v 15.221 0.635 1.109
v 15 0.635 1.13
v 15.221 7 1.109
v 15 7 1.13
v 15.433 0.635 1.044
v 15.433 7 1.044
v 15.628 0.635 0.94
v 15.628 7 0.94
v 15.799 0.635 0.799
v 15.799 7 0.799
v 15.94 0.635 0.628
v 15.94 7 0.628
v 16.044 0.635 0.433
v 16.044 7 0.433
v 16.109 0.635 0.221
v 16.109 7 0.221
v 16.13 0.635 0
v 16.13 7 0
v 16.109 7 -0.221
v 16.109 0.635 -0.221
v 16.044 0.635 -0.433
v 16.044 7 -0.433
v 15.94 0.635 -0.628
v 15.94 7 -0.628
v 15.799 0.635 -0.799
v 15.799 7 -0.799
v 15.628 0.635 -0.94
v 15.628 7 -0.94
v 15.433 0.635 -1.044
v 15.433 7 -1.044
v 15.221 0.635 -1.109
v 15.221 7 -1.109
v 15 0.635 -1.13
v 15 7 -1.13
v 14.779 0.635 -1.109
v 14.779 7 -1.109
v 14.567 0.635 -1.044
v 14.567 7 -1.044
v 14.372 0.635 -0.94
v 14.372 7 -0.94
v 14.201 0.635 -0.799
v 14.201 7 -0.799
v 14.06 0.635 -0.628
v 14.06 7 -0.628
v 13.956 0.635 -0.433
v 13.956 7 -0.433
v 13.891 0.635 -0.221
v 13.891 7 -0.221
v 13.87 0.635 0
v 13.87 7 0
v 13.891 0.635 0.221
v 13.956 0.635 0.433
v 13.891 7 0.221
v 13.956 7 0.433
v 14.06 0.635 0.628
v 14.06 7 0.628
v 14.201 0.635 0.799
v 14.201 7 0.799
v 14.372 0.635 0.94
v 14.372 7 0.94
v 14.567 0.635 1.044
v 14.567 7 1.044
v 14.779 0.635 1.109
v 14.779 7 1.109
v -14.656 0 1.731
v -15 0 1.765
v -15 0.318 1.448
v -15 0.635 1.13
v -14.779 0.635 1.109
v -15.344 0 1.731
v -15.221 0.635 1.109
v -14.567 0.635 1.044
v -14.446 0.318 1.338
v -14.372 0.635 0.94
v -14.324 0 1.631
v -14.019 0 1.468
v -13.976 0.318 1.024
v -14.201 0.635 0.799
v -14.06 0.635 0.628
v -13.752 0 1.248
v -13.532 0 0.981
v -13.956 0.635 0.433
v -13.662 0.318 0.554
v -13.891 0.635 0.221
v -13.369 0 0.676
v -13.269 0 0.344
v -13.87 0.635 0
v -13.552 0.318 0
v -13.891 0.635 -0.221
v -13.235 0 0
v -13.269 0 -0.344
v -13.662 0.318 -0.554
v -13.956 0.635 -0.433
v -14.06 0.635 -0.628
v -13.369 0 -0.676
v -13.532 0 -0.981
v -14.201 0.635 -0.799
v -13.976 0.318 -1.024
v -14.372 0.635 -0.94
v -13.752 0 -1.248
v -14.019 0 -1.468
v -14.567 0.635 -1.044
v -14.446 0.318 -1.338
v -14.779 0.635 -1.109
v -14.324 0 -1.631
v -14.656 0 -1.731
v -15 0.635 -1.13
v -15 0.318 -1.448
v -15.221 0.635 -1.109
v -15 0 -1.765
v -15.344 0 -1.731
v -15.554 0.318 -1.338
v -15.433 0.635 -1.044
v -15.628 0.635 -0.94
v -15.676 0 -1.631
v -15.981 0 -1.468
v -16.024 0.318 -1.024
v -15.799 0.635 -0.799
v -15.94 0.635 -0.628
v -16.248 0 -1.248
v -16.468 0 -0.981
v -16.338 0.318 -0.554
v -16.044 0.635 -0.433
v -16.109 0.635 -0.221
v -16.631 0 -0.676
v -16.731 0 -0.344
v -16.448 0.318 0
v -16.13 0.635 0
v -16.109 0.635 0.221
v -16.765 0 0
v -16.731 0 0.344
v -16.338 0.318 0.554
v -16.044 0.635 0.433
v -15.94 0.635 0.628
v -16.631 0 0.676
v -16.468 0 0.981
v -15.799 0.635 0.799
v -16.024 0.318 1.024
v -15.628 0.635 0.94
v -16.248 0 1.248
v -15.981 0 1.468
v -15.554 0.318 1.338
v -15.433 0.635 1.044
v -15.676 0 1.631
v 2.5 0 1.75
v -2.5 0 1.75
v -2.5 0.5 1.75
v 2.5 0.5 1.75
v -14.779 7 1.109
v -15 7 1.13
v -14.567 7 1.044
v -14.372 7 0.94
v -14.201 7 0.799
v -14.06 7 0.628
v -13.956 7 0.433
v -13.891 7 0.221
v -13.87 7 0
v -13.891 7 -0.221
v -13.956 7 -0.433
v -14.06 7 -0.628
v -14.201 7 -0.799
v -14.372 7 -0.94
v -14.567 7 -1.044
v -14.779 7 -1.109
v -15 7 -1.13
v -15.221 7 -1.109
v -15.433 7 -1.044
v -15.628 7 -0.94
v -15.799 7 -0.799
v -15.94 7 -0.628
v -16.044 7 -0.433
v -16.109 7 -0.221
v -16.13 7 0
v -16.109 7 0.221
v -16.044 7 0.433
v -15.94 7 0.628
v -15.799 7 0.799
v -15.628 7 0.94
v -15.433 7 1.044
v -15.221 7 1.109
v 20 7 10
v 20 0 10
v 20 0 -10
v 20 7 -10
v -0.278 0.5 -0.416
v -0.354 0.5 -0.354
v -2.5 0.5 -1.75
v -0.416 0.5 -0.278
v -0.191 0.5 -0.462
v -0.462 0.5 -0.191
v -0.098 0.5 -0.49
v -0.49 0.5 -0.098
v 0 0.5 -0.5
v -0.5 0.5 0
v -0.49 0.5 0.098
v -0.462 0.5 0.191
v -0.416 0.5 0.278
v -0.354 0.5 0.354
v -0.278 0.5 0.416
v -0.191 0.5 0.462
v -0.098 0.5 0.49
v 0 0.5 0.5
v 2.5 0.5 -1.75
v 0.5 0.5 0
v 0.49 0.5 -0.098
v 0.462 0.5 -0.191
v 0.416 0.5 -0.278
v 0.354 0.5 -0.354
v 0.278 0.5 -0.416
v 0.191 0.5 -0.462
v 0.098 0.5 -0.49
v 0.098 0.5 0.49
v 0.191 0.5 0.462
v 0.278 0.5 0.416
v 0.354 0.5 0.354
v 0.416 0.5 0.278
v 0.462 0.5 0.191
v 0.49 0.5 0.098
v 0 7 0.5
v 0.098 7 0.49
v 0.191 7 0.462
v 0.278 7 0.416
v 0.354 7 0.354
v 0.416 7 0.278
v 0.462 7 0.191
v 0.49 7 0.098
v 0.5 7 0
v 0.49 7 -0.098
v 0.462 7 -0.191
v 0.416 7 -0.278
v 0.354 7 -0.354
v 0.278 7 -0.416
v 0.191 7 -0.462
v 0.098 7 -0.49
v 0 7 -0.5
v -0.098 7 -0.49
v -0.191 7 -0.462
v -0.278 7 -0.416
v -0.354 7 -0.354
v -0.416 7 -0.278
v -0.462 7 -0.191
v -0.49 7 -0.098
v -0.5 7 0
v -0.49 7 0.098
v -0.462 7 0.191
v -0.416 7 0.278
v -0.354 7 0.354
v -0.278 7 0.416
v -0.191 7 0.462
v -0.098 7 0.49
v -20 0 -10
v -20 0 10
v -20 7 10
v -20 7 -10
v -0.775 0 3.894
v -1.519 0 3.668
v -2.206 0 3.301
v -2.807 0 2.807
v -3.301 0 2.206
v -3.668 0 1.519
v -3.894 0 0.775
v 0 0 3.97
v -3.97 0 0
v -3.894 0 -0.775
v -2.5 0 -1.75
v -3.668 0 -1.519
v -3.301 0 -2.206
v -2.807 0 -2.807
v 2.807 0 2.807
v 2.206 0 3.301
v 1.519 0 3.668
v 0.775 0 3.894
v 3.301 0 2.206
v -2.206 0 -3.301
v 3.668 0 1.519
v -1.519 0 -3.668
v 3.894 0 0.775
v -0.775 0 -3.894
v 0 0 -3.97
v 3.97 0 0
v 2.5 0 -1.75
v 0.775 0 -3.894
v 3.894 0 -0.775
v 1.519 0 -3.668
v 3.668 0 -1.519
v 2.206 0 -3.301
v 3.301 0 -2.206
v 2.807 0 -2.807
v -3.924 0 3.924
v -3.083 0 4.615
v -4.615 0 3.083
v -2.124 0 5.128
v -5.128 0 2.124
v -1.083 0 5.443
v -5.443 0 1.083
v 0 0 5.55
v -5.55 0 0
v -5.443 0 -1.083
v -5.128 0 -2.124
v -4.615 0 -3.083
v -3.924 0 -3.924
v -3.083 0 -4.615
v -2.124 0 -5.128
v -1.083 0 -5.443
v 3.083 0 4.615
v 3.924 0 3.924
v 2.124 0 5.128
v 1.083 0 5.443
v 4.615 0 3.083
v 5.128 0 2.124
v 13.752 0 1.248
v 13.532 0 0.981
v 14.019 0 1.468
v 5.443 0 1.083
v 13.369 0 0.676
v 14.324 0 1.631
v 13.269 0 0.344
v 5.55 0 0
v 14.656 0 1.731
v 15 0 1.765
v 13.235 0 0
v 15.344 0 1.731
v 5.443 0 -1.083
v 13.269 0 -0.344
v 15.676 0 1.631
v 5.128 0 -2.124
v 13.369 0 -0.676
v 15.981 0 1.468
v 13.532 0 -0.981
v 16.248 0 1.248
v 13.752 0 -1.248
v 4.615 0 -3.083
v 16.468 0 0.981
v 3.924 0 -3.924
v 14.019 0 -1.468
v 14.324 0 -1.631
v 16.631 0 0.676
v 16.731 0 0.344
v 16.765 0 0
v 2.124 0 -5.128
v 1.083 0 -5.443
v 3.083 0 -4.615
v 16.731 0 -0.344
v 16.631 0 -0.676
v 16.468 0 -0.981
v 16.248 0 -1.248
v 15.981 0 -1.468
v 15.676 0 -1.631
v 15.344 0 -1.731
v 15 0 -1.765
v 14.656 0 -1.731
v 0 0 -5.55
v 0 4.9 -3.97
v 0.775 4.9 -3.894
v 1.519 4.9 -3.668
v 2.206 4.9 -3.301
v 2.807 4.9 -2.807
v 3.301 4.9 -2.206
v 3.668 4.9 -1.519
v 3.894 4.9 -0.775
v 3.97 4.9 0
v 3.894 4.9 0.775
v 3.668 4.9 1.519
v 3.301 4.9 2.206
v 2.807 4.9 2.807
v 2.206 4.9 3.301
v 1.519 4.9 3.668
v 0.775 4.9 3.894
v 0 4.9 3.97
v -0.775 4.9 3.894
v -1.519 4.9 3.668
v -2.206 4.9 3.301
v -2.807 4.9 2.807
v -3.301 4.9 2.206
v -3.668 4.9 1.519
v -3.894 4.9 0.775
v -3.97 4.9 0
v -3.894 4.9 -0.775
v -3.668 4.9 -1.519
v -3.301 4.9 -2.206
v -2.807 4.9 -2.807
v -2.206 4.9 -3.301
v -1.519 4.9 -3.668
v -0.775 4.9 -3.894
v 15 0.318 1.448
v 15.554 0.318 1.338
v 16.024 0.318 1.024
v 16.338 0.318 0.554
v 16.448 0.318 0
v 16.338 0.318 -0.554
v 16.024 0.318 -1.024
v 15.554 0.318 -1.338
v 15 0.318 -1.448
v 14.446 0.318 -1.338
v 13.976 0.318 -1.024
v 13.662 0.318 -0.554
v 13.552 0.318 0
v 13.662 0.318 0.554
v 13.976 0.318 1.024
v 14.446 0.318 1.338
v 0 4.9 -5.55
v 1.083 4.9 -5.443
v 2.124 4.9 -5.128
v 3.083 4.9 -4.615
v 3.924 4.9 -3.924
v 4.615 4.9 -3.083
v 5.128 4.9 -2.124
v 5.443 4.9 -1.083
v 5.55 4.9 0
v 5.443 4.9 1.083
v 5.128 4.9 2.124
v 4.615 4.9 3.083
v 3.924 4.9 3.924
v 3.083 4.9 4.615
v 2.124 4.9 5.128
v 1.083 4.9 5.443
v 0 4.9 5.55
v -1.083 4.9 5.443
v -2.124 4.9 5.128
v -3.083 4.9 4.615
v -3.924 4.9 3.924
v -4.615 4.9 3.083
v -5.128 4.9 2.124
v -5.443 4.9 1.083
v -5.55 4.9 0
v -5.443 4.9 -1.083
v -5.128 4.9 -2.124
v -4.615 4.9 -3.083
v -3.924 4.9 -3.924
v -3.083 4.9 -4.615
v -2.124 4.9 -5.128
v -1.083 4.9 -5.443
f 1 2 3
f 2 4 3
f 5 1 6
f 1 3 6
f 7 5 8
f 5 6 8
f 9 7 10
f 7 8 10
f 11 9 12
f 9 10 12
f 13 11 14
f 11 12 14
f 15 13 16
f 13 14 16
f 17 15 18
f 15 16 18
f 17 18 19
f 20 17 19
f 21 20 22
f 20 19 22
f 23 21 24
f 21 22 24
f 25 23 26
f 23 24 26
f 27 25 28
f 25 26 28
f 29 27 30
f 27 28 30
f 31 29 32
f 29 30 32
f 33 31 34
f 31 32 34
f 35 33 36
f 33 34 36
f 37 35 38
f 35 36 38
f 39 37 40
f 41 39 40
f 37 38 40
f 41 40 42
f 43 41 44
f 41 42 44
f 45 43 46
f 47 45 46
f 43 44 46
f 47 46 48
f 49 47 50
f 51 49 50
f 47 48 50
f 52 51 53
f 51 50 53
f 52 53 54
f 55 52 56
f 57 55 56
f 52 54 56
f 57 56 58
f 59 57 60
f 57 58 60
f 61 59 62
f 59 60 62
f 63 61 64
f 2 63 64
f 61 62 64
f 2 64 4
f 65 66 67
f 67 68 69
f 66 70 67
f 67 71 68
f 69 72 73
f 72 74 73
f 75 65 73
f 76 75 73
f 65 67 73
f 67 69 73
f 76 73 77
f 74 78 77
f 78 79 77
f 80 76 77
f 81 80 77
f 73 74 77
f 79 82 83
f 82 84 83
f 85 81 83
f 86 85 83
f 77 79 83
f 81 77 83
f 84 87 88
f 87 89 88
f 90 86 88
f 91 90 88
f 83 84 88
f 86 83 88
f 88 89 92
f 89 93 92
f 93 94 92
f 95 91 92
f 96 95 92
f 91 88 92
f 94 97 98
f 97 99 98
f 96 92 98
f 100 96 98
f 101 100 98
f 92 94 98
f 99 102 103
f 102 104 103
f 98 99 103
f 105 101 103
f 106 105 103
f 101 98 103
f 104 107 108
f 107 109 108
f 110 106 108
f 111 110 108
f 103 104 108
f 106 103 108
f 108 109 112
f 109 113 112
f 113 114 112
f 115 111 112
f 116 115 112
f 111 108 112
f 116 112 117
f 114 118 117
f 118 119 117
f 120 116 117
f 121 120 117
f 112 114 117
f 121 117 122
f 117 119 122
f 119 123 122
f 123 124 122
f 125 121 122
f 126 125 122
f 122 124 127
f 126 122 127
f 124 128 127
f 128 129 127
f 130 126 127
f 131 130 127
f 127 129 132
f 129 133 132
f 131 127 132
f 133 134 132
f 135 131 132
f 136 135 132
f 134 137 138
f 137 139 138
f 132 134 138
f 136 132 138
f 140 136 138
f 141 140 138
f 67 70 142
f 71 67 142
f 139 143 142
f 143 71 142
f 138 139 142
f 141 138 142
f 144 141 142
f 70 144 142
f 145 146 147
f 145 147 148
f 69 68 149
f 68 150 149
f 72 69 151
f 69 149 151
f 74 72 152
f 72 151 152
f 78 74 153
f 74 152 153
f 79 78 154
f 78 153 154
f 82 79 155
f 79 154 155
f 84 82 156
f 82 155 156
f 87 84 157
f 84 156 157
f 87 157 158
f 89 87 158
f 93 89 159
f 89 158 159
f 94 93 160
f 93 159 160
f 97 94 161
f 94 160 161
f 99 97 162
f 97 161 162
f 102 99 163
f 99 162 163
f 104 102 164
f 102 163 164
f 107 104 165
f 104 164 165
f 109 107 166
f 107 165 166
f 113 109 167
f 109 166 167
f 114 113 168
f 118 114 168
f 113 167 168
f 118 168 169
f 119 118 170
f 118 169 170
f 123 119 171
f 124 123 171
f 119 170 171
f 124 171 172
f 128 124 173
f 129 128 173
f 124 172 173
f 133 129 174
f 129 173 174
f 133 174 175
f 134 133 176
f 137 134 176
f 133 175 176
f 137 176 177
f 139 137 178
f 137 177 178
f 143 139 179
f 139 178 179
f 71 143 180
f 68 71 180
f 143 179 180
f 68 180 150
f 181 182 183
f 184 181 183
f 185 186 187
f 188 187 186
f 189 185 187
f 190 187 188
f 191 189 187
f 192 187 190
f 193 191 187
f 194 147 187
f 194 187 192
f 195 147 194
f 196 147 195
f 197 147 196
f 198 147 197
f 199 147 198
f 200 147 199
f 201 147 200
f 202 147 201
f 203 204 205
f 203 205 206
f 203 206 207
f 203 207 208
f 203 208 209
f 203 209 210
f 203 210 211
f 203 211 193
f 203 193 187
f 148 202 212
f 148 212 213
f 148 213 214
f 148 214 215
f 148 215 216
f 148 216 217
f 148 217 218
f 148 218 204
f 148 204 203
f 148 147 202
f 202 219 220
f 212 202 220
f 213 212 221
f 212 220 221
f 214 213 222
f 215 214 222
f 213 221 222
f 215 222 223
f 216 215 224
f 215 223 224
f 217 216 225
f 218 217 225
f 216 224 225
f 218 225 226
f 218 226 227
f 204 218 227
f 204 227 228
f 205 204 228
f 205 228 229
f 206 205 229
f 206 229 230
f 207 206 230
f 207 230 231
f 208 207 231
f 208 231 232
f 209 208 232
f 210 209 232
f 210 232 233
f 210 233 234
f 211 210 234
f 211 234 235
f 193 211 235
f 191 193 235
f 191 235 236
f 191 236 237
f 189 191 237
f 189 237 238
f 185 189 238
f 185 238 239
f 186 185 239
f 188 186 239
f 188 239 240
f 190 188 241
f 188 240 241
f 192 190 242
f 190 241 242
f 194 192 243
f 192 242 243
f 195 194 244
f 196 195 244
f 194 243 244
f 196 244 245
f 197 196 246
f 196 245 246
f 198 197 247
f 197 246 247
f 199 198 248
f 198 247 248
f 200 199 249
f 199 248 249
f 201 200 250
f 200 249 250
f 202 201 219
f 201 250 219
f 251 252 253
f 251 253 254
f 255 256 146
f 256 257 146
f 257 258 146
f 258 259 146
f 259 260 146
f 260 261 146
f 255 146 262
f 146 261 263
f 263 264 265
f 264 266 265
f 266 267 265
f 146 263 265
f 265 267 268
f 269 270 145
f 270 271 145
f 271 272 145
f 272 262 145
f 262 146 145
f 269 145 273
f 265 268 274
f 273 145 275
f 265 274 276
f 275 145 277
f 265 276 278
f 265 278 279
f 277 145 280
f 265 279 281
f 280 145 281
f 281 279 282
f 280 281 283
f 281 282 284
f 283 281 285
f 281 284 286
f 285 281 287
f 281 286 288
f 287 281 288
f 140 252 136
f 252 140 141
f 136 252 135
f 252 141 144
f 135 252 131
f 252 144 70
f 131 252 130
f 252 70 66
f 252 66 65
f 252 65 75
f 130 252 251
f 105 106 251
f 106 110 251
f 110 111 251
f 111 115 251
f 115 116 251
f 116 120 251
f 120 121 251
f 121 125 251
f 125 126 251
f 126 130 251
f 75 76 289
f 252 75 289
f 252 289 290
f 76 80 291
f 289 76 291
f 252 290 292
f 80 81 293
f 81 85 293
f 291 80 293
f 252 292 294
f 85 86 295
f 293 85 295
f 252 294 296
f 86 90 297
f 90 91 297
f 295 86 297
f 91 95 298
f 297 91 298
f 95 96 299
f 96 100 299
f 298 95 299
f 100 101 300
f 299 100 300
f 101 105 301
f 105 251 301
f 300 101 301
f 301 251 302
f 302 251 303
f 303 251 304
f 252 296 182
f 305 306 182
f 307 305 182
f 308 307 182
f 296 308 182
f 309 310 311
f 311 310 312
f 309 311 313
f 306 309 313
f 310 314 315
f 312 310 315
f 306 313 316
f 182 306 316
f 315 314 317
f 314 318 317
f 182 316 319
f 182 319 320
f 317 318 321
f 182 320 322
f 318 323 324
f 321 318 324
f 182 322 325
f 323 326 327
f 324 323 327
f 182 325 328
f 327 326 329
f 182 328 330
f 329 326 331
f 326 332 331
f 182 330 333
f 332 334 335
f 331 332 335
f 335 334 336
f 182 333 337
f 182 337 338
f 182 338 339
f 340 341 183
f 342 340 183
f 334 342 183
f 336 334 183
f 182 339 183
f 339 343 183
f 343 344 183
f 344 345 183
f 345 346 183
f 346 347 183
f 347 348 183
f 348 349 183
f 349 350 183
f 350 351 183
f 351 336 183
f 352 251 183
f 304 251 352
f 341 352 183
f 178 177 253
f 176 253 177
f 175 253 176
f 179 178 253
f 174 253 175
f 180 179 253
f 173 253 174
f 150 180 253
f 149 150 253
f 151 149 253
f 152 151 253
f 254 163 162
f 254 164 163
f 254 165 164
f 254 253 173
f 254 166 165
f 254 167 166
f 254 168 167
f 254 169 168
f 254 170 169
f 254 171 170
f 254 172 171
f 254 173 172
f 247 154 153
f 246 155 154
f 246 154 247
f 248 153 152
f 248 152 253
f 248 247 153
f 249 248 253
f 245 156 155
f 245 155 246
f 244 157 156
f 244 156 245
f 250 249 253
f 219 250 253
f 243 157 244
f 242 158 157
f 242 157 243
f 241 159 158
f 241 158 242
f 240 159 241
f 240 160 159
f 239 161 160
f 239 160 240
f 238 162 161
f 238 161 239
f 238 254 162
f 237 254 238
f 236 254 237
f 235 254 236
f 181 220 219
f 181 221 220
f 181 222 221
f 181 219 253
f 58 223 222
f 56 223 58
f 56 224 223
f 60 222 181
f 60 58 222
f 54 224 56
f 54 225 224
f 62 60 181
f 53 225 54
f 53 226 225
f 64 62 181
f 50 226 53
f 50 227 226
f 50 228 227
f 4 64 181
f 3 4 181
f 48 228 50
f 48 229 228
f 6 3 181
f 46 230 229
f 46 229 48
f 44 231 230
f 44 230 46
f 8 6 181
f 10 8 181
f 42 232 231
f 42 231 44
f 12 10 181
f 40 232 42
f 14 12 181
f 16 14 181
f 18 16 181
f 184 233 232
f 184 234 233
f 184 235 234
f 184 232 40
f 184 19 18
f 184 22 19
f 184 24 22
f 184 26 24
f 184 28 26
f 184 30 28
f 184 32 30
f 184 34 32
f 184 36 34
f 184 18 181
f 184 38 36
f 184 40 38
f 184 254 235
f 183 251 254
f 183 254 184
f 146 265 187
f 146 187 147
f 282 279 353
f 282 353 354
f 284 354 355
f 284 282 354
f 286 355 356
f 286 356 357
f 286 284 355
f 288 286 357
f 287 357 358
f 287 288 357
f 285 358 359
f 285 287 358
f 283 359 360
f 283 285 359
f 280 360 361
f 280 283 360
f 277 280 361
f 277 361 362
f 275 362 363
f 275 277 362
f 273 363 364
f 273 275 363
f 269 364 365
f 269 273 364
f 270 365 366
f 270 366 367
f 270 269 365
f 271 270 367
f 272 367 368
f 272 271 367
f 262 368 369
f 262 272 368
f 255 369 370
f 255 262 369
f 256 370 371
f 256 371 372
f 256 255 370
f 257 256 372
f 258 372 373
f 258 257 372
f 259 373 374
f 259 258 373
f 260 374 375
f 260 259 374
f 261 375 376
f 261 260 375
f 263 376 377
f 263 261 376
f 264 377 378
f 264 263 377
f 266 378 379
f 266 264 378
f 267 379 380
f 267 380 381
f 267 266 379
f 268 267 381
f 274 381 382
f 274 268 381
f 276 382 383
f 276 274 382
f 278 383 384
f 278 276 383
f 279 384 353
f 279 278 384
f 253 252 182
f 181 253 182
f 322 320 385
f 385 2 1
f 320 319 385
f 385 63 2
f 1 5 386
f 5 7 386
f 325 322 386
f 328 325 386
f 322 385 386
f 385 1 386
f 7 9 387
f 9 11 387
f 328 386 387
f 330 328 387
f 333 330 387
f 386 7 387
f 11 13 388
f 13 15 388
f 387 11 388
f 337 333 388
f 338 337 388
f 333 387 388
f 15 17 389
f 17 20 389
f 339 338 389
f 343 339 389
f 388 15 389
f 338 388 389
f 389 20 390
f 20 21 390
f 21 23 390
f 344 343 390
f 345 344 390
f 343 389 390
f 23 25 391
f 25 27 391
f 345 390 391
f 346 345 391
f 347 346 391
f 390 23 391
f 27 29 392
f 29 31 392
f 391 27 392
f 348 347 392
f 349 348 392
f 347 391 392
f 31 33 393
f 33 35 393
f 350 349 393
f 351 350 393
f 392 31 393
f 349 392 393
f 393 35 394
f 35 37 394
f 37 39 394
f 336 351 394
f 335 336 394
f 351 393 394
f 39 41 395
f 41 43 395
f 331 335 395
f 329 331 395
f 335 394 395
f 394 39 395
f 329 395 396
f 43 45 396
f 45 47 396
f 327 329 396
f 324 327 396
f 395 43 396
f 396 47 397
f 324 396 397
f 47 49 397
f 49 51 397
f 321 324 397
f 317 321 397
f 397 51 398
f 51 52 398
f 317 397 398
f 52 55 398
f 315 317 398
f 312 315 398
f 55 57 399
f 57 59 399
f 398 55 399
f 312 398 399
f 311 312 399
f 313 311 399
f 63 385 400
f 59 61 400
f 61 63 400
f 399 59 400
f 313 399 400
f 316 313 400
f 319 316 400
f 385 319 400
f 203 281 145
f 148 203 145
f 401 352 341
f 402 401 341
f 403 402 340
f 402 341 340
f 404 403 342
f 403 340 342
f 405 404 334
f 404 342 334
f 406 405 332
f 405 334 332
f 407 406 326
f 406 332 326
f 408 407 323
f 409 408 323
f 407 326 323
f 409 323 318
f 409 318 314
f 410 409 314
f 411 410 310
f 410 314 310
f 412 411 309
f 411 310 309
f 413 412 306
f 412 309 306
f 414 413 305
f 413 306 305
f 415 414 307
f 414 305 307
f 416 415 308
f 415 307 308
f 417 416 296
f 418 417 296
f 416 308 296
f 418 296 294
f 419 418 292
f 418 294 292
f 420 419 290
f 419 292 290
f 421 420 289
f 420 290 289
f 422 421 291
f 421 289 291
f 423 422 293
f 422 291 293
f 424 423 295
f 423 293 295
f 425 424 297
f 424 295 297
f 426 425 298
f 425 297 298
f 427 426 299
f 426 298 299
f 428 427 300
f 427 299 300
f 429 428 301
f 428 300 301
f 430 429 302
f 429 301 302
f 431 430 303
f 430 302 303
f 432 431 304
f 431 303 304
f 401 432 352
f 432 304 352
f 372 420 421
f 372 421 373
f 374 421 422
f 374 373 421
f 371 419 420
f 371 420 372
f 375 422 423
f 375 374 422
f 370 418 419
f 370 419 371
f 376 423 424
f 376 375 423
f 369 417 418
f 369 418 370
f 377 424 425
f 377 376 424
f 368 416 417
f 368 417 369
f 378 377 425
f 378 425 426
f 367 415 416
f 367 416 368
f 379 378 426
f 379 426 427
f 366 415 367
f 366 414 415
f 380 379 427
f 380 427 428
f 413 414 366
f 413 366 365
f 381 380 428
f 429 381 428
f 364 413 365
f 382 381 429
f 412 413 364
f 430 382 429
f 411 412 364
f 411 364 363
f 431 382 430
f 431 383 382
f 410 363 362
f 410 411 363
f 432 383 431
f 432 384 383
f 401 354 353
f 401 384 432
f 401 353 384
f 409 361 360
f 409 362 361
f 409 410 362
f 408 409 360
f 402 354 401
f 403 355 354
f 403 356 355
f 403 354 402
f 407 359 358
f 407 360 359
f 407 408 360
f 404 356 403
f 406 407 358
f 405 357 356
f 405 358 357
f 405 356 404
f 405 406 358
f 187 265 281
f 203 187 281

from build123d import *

# Parameters (mm, degrees)
SKETCH1_W                       = 40
SKETCH1_H                       = 20
BOSS_EXTRUDE1_DEPTH             = 7
SKETCH2_R                       = 0.5
CUT_EXTRUDE1_DEPTH              = 6.72
F_4_40_TAPPED_HOLE1_D           = 2.2606
F_4_40_TAPPED_HOLE1_CSINK_D     = 3.5306
F_4_40_TAPPED_HOLE1_CSINK_ANGLE = 90
LPATTERN1_COUNT                 = 2
LPATTERN1_PITCH                 = 30
SKETCH12_R                      = 5.55
SKETCH12_R_2                    = 3.97
CUT_EXTRUDE2_DEPTH              = 4.9
SKETCH13_W                      = 5
SKETCH13_H                      = 3.5
CUT_EXTRUDE3_DEPTH              = 0.5


with BuildPart() as part:
    # Sketch1 → Boss-Extrude1 (new body)
    with BuildSketch(Plane(origin=(0, 0, 0), x_dir=(1, 0, 0), z_dir=(0, 1, 0))):
        Rectangle(SKETCH1_W, SKETCH1_H)
    extrude(amount=BOSS_EXTRUDE1_DEPTH)

    # Sketch2 → Cut-Extrude1 (cut)
    with BuildSketch(Plane(origin=(0, 7, 0), x_dir=(1, 0, 0), z_dir=(0, 1, 0))):
        with Locations(Location((0, 0, 0), (0, 0, 270))):
            Circle(SKETCH2_R)
    extrude(amount=-CUT_EXTRUDE1_DEPTH, mode=Mode.SUBTRACT)

    # #4-40 Tapped Hole1 (through all)
    with Locations(Plane(origin=(-15, 0, 0), x_dir=(0, 0, -1), z_dir=(0, -1, 0))):
        with Locations((0, 0)):
            f_4_40_tapped_hole1 = CounterSinkHole(F_4_40_TAPPED_HOLE1_D / 2, F_4_40_TAPPED_HOLE1_CSINK_D / 2, counter_sink_angle=F_4_40_TAPPED_HOLE1_CSINK_ANGLE)

    # LPattern1: #4-40 Tapped Hole1 ×2
    with Locations(*[(i * LPATTERN1_PITCH, 0, 0) for i in range(1, LPATTERN1_COUNT)]):
        add(f_4_40_tapped_hole1, mode=Mode.SUBTRACT)

    # Sketch12 → Cut-Extrude2 (cut)
    with BuildSketch(Plane.XZ):
        with Locations(Location((0, 0, 0), (0, 0, 270))):
            Circle(SKETCH12_R)
        with Locations(Location((0, 0, 0), (0, 0, 270))):
            Circle(SKETCH12_R_2, mode=Mode.SUBTRACT)
    extrude(amount=-CUT_EXTRUDE2_DEPTH, mode=Mode.SUBTRACT)

    # Sketch13 → Cut-Extrude3 (cut)
    with BuildSketch(Plane.XZ):
        Rectangle(SKETCH13_W, SKETCH13_H)
    extrude(amount=-CUT_EXTRUDE3_DEPTH, mode=Mode.SUBTRACT)


solid = part.part
